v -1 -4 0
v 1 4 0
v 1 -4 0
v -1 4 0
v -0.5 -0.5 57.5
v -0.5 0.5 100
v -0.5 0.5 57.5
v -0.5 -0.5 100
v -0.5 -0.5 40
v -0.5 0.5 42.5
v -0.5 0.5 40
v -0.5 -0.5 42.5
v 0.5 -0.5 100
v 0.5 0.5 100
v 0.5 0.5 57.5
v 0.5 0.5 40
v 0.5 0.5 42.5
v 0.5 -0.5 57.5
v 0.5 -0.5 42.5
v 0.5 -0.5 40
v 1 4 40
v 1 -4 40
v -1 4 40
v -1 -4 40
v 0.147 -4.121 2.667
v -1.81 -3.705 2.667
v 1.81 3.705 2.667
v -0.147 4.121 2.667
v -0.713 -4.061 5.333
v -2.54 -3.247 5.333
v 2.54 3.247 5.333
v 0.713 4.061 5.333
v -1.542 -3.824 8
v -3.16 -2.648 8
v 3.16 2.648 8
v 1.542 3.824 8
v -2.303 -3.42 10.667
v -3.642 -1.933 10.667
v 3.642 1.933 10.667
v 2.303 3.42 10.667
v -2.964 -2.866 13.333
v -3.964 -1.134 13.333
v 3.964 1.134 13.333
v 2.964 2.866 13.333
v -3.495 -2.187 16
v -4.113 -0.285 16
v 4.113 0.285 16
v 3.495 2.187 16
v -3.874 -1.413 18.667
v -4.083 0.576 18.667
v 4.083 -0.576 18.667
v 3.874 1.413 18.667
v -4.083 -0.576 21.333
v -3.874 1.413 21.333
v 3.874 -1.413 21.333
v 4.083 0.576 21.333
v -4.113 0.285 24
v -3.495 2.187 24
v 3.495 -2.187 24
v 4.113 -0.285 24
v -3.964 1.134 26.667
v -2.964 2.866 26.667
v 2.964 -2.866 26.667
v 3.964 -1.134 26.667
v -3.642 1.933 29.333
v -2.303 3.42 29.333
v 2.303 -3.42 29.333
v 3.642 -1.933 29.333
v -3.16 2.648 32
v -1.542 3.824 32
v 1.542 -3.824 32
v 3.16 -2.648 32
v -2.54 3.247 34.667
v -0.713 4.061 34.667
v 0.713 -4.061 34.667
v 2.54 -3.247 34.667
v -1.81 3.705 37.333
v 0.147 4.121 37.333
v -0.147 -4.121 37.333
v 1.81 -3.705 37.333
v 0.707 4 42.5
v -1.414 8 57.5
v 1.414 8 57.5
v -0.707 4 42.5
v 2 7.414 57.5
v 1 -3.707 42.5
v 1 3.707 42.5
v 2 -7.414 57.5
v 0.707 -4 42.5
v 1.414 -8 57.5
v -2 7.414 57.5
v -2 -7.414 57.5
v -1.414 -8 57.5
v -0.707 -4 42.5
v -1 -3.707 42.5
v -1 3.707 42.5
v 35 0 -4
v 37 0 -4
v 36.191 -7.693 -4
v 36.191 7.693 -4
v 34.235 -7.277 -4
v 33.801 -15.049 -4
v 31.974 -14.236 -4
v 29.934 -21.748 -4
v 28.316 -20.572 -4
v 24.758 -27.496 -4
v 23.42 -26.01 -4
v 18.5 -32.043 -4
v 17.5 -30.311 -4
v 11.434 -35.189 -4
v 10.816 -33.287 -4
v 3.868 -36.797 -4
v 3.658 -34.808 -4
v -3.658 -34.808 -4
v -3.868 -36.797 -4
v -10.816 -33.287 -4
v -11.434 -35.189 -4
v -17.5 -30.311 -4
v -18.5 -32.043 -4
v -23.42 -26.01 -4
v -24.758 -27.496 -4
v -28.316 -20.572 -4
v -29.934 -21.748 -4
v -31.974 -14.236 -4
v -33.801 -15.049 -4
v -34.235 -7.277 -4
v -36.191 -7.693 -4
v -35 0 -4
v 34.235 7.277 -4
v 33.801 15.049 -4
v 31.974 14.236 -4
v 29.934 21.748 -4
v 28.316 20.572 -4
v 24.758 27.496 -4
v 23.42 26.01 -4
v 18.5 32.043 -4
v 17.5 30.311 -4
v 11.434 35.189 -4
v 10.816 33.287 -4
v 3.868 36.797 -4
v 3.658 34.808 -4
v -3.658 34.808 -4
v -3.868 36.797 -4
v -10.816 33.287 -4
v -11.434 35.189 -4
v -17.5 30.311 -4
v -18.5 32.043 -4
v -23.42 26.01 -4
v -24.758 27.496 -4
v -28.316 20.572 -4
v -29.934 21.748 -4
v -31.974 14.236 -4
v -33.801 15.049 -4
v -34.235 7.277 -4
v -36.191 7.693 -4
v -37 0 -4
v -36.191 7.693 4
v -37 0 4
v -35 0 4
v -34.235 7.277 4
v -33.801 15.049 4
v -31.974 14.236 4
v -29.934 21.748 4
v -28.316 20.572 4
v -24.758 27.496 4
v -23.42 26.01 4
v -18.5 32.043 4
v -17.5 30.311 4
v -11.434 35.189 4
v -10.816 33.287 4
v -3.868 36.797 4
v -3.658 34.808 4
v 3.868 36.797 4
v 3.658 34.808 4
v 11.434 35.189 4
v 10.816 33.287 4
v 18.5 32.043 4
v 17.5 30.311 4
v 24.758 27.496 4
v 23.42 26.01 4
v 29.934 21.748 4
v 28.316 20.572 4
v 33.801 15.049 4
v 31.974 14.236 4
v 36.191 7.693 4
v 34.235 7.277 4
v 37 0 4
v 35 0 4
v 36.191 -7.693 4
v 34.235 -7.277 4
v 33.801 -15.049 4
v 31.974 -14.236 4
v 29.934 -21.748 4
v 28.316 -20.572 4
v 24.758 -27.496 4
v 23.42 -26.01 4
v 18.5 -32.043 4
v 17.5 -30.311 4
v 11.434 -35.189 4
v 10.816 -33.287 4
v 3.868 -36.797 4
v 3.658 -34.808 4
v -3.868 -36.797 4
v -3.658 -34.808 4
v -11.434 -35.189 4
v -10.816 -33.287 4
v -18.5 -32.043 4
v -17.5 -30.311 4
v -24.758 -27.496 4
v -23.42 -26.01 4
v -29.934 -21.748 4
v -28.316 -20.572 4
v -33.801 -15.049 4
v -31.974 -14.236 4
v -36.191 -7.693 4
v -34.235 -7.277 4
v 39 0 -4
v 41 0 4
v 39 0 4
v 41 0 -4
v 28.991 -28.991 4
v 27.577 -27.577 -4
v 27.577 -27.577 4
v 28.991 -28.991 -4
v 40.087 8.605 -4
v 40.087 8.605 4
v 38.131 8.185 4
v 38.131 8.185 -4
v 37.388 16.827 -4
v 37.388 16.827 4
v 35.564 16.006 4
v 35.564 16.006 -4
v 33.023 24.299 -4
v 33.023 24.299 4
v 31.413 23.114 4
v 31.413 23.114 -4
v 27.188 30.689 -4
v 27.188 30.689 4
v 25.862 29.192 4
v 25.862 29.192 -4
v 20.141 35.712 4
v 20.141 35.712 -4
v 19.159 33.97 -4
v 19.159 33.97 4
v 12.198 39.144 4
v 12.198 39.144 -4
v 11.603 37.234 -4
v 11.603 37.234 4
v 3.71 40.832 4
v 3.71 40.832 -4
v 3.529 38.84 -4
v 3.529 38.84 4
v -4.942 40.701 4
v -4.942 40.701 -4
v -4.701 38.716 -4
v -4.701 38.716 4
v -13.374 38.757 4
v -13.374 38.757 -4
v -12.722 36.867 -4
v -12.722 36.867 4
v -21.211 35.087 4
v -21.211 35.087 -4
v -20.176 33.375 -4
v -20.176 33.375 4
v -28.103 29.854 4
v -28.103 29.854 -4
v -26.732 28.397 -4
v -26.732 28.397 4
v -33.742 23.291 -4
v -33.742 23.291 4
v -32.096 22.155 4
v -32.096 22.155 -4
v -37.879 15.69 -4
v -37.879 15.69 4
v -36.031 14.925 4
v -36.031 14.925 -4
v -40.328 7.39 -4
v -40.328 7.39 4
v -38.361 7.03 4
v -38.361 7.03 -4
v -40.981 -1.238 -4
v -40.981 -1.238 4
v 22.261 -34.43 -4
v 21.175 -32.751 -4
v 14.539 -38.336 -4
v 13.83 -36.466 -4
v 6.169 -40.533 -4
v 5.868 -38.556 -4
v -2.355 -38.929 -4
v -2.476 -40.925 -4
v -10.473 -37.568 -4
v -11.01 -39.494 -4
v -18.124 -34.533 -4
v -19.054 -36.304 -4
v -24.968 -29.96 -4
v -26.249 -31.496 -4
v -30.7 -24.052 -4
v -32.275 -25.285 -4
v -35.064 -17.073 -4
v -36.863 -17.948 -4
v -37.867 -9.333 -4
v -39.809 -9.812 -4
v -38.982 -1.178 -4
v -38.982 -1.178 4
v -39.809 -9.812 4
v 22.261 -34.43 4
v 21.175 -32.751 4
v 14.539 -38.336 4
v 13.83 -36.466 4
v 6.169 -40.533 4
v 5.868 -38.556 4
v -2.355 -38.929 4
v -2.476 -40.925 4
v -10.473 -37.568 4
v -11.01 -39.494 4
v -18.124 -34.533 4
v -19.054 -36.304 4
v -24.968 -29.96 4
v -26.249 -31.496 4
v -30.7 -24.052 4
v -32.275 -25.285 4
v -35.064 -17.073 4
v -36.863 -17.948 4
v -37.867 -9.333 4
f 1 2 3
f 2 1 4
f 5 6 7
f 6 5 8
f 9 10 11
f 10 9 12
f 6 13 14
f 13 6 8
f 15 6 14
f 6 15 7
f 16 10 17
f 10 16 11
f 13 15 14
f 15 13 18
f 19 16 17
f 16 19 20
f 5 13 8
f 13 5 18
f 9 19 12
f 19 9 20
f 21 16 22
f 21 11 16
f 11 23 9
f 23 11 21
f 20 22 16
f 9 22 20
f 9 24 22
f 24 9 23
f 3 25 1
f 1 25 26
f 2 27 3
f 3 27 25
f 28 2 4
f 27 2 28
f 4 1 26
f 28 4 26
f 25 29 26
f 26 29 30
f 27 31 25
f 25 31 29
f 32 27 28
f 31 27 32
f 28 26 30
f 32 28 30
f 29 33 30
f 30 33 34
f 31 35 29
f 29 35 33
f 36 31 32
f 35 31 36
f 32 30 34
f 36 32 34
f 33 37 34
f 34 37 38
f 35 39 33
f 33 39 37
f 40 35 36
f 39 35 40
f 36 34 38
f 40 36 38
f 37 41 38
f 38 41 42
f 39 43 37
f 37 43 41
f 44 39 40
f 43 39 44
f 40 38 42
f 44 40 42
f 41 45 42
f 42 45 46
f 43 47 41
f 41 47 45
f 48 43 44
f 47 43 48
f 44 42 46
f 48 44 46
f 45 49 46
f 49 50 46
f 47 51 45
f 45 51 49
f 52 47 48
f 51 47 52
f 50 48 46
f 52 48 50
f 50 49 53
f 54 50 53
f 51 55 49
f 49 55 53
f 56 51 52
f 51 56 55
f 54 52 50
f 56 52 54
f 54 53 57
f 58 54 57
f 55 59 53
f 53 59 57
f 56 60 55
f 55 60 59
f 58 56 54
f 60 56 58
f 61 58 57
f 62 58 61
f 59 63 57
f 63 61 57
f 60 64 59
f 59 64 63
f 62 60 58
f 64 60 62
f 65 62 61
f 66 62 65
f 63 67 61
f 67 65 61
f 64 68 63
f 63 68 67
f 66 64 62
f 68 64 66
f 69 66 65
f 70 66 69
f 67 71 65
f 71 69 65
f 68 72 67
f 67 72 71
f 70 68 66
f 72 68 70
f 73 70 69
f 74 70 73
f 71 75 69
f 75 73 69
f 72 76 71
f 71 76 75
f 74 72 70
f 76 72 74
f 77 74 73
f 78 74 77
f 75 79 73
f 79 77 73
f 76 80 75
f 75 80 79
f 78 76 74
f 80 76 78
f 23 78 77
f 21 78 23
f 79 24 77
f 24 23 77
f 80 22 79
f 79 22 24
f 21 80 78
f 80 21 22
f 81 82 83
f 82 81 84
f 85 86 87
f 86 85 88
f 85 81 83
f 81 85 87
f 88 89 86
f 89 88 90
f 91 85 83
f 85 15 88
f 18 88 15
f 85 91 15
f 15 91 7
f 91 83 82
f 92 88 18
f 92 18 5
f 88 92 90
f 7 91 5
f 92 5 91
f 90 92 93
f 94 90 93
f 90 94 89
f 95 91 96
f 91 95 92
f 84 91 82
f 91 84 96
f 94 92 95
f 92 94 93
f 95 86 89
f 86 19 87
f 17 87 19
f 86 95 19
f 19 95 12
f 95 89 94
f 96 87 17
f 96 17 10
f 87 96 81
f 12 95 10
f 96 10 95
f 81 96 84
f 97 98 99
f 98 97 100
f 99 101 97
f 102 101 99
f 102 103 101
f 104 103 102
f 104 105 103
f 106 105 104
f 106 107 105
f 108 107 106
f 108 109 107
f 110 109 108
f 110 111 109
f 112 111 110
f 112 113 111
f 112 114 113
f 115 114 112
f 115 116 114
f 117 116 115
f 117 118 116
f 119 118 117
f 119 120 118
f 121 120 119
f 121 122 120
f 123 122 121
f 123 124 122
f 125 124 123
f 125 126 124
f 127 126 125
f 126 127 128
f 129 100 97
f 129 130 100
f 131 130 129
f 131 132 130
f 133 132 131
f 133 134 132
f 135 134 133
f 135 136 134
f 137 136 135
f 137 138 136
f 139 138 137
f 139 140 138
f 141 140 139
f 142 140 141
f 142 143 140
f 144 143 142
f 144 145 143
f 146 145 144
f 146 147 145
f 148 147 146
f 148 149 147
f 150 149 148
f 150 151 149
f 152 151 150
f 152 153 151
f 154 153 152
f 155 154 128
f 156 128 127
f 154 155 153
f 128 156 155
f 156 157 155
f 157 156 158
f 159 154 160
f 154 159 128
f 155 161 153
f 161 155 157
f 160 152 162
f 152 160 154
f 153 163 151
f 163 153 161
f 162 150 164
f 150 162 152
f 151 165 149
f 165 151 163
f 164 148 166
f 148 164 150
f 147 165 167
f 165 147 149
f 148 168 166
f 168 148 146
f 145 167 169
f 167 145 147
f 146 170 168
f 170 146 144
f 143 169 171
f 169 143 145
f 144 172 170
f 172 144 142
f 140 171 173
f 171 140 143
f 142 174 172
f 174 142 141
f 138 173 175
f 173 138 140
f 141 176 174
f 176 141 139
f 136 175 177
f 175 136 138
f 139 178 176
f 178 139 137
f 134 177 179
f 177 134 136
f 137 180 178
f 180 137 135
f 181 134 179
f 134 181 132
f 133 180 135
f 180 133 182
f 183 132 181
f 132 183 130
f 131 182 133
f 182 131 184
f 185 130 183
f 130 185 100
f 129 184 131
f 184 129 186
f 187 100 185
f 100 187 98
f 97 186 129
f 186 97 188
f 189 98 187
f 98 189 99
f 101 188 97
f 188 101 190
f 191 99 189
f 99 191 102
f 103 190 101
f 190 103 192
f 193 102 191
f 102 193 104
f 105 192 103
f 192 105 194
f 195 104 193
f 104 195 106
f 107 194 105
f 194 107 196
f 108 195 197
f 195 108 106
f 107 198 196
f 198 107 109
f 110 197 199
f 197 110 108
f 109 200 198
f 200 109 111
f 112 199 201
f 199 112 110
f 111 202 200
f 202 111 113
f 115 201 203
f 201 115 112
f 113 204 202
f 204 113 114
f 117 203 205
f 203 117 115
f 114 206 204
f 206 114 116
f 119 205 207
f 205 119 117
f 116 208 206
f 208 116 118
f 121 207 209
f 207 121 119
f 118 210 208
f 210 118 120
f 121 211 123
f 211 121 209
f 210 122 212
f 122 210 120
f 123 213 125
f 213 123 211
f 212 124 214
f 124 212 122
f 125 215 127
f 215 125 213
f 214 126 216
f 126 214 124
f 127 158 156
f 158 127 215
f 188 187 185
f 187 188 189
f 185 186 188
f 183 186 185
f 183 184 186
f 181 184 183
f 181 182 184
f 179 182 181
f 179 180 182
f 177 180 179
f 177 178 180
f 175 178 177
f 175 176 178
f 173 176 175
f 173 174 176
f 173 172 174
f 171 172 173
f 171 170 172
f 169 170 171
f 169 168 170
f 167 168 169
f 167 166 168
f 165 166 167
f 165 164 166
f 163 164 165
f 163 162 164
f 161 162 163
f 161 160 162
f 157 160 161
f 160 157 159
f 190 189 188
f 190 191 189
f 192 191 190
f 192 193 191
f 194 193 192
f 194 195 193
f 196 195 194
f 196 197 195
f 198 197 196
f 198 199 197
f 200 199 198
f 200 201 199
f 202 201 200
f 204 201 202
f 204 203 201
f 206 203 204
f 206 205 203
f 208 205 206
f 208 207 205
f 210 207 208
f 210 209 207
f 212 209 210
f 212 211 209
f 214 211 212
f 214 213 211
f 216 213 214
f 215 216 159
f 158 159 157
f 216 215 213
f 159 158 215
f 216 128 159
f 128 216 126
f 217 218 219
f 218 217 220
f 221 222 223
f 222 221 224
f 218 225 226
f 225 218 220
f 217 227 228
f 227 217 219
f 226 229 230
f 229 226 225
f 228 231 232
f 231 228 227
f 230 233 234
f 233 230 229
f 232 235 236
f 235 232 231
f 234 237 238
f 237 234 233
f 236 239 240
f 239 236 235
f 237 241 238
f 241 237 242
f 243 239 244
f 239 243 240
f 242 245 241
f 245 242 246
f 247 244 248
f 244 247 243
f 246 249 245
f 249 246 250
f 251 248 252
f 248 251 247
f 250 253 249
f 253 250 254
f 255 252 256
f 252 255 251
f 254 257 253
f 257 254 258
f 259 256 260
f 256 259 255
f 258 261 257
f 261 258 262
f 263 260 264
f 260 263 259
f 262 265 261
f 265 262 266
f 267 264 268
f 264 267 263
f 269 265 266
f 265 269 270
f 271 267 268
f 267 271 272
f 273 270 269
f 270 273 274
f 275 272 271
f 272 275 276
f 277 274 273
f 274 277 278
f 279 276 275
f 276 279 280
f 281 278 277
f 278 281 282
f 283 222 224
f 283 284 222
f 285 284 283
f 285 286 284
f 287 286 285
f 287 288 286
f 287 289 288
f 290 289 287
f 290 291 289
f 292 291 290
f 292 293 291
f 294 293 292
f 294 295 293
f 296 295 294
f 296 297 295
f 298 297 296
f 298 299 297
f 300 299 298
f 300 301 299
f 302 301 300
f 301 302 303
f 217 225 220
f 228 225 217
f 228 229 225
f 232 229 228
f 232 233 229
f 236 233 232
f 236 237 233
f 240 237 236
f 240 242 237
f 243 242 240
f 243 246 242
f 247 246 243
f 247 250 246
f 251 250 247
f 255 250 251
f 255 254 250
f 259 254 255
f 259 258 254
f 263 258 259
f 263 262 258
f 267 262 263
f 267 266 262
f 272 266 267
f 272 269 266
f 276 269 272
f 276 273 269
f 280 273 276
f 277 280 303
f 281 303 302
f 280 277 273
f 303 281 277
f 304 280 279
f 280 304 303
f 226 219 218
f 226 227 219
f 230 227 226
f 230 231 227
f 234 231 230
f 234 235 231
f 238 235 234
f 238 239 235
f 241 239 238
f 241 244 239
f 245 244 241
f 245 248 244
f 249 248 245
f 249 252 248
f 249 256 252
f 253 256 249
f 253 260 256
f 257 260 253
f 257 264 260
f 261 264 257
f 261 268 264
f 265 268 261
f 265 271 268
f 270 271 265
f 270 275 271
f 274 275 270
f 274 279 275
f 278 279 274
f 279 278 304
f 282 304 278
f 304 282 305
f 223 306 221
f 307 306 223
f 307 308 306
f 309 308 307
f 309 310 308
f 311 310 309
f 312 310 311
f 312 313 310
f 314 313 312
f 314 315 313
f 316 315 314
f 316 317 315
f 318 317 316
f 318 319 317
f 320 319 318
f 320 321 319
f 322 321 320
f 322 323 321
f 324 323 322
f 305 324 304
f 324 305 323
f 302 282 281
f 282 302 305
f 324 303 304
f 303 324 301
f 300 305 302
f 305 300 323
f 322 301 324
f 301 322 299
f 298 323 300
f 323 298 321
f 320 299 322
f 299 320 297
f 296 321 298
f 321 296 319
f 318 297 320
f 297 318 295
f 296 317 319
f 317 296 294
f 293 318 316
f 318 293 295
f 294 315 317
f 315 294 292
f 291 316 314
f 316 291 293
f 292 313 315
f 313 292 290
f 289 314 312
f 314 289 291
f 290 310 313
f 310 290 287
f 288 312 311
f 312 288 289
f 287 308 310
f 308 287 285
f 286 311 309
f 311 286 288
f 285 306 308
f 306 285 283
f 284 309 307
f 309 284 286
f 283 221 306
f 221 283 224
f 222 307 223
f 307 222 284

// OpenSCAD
linear_extrude() {
    square(size=[1, 1], center=true);
};

linear_extrude(height=40, twist=180) {
    square(size=[2, 8], center=true);
};

translate(v=[0, 0, 50]) {
    linear_extrude(height=15, center=true, scale=2) {
        offset(delta=0.5, chamfer=true) {
            offset(delta=-0.5, chamfer=true) {
                square(size=[2, 8], center=true);
            };
        };
    };
};

rotate_extrude() {
    translate(v=[36, 0]) {
        square(size=[2, 8], center=true);
    };
};

rotate_extrude(angle=315) {
    translate(v=[40, 0]) {
        square(size=[2, 8], center=true);
    };
};
